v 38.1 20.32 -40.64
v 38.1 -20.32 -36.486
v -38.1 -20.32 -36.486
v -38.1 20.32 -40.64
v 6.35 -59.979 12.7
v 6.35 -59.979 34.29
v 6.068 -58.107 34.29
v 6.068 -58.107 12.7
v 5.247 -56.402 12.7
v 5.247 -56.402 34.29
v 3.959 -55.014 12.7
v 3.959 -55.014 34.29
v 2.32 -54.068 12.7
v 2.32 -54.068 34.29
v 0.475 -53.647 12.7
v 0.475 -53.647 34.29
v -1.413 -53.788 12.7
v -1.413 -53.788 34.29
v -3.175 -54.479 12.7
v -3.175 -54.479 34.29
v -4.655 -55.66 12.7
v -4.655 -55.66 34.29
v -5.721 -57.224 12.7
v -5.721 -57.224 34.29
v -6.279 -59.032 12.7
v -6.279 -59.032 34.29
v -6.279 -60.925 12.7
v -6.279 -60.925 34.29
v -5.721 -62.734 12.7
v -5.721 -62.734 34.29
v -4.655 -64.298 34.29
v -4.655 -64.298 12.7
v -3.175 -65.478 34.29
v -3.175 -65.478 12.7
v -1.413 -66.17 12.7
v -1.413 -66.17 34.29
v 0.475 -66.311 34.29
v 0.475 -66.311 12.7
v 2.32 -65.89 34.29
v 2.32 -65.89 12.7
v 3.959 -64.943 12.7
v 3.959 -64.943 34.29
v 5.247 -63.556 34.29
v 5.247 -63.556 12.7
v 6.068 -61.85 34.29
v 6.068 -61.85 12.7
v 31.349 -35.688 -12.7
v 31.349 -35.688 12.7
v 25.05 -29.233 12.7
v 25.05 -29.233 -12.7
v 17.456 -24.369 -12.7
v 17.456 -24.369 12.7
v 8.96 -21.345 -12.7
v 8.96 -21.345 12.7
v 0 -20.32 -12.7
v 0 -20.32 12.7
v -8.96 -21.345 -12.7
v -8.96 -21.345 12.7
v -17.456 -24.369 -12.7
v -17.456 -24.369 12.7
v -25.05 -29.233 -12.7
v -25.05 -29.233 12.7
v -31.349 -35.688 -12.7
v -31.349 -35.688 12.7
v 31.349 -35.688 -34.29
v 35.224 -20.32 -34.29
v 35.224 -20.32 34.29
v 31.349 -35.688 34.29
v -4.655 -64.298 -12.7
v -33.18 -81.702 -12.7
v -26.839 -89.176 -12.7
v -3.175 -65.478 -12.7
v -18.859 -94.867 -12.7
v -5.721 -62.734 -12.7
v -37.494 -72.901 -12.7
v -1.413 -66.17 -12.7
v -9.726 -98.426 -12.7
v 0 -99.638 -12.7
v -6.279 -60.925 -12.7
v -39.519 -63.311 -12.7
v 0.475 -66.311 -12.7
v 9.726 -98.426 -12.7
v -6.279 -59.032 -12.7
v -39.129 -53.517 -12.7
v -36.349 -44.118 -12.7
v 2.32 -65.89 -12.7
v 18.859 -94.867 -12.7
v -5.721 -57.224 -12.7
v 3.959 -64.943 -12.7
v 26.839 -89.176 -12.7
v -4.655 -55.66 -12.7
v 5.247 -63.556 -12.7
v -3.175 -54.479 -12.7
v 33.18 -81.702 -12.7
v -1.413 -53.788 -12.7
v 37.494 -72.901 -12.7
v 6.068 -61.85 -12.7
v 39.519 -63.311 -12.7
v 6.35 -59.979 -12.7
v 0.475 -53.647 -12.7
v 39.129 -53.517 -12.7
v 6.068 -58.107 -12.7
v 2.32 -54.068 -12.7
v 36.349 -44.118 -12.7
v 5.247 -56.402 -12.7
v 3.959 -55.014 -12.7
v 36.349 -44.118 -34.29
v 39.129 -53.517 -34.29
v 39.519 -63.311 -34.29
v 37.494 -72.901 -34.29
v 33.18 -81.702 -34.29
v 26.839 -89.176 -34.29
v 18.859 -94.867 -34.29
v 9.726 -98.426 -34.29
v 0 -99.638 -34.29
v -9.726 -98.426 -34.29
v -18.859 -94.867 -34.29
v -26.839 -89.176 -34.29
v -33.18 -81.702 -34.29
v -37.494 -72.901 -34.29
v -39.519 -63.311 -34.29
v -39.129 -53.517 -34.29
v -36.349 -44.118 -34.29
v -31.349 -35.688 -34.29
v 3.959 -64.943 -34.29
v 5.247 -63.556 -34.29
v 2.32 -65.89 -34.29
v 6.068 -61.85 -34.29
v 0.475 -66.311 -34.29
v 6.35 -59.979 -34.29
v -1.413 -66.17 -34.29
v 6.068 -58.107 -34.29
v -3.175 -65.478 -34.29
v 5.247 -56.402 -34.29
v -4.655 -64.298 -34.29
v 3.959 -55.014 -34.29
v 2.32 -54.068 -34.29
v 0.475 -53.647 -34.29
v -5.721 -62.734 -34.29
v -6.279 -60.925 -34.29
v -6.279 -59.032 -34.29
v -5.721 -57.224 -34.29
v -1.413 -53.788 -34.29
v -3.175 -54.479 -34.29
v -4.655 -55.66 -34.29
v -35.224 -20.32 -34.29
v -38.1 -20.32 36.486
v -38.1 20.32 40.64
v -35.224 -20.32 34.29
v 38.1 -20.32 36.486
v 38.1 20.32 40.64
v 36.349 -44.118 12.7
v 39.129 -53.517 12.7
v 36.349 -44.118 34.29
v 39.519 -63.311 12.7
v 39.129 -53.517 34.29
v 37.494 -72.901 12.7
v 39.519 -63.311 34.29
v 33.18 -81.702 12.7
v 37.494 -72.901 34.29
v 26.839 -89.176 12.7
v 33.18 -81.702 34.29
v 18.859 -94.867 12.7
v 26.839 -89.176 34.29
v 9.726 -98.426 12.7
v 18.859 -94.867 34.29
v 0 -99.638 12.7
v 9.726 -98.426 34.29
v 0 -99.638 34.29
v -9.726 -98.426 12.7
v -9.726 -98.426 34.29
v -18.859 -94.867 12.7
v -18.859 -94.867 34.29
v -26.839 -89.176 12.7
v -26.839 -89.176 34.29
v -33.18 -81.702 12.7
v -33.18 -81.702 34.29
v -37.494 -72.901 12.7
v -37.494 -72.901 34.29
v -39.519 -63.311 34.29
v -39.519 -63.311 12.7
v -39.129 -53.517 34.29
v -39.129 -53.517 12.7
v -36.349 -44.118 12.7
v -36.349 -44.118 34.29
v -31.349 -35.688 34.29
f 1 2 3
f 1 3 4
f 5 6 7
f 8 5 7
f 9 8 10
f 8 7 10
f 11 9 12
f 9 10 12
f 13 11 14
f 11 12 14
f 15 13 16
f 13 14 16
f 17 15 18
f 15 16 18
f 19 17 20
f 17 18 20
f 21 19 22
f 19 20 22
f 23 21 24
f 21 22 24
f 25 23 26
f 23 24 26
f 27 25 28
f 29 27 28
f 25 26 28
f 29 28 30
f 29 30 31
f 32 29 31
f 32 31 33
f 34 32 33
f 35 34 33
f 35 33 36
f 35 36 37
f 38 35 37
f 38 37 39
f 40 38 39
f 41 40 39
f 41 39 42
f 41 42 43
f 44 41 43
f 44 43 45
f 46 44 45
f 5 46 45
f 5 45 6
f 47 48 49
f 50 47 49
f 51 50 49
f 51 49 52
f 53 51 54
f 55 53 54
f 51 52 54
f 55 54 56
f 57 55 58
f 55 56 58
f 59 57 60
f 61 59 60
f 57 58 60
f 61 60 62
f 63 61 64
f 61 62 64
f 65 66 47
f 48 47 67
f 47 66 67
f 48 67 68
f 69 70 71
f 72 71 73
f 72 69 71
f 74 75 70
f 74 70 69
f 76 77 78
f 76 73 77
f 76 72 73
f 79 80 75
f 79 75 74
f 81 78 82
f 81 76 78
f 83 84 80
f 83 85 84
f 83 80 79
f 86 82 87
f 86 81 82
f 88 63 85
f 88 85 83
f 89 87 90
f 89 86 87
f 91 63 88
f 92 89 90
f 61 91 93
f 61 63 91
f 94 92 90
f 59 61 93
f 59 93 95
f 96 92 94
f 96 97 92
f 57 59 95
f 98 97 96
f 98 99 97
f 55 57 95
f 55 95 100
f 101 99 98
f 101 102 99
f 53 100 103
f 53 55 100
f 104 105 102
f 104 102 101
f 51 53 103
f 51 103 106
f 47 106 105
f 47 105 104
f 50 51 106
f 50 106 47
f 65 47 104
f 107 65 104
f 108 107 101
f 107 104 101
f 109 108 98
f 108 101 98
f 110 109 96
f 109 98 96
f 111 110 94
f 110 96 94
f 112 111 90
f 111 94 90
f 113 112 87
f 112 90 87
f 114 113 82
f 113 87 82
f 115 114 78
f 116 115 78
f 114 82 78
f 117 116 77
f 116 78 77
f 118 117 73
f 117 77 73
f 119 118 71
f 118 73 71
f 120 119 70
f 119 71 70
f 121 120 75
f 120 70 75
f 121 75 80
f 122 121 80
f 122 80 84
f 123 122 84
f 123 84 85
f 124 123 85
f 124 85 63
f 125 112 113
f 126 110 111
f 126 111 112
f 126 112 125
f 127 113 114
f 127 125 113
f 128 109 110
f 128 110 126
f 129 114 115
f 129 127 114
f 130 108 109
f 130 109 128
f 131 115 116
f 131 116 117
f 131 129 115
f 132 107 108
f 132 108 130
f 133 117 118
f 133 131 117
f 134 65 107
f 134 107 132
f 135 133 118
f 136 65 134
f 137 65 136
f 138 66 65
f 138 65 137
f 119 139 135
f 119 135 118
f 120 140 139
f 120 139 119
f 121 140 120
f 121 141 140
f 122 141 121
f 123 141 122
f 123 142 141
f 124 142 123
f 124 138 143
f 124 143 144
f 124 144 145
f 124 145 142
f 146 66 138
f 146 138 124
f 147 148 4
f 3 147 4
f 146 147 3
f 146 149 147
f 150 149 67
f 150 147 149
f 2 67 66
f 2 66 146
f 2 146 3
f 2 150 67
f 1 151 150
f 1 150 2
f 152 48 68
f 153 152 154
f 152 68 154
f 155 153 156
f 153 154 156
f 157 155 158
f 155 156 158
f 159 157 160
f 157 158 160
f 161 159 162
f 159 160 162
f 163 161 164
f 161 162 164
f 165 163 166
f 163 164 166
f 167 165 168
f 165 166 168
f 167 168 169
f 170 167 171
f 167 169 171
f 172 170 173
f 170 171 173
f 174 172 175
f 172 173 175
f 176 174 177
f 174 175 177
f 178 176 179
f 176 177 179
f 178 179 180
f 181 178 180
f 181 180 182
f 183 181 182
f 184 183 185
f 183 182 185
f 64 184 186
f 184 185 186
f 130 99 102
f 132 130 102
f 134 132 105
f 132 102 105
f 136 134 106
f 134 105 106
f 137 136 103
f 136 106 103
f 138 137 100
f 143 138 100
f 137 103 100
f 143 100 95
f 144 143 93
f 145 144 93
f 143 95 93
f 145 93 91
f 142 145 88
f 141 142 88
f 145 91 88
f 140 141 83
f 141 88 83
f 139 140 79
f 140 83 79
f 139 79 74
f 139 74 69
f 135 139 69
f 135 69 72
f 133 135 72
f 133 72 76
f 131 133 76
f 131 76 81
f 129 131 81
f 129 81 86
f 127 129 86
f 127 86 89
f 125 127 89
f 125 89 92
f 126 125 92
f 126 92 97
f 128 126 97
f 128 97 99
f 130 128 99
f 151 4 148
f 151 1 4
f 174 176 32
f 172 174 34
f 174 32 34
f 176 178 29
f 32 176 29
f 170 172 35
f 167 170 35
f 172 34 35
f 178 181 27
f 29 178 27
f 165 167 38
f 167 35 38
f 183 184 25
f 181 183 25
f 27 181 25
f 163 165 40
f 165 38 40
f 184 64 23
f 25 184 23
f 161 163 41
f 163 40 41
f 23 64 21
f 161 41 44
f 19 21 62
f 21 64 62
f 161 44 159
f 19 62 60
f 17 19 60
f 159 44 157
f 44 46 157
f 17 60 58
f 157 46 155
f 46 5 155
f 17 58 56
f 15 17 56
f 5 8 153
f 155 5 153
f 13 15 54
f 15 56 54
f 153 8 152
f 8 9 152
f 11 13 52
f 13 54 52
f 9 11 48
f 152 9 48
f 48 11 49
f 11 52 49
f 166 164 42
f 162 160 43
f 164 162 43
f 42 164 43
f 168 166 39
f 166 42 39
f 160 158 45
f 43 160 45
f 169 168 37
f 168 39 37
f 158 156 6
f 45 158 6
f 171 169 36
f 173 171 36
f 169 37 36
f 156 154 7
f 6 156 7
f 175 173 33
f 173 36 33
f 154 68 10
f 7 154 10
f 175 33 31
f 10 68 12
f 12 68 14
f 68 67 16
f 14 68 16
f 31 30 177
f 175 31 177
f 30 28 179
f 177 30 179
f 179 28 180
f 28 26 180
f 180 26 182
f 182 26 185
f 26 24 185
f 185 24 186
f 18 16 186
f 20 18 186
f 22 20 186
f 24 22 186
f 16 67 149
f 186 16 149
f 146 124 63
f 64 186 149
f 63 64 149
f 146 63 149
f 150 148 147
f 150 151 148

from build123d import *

# Parameters (mm, degrees)
SALIENTE_EXTRUIR1_DEPTH = 38.1
SALIENTE_EXTRUIR2_DEPTH = 34.29
CROQUIS3_R              = 39.658757808
CORTAR_EXTRUIR1_DEPTH   = 12.7
CROQUIS4_R              = 6.35
CORTAR_EXTRUIR2_DEPTH   = 75.93


with BuildPart() as part:
    # Croquis1 → Saliente-Extruir1 (new body, symmetric)
    with BuildSketch(Plane(origin=(0, 0, 0), x_dir=(0, 0, -1), z_dir=(1, 0, 0))):
        Polygon((-40.64, 20.319999995), (-36.486122257, -20.319999995), (0, -20.319999995), (36.486122257, -20.319999995), (40.64, 20.319999995), align=None)
    extrude(amount=SALIENTE_EXTRUIR1_DEPTH, both=True)

    # Croquis2 → Saliente-Extruir2 (add, symmetric)
    with BuildSketch(Plane.XY):
        with BuildLine():
            Line((35.223664747, -20.319999995), (31.348920302, -35.687560492))
            ThreePointArc((31.348920302, -35.687560492), (0, -99.63751561), (-31.348920302, -35.687560492))
            Line((-31.348920302, -35.687560492), (-35.223664747, -20.319999995))
            Line((-35.223664747, -20.319999995), (35.223664747, -20.319999995))
        make_face()
    extrude(amount=SALIENTE_EXTRUIR2_DEPTH, both=True)

    # Croquis3 → Cortar-Extruir1 (cut, symmetric)
    with BuildSketch(Plane.XY):
        with Locations((0, -59.978757803)):
            Circle(CROQUIS3_R)
    extrude(amount=CORTAR_EXTRUIR1_DEPTH, both=True, mode=Mode.SUBTRACT)

    # Croquis4 → Cortar-Extruir2 (cut, through all)
    with BuildSketch(Plane.XY.offset(34.29)):
        with Locations((0, -59.978757803)):
            Circle(CROQUIS4_R)
    extrude(amount=-CORTAR_EXTRUIR2_DEPTH, mode=Mode.SUBTRACT)


solid = part.part
